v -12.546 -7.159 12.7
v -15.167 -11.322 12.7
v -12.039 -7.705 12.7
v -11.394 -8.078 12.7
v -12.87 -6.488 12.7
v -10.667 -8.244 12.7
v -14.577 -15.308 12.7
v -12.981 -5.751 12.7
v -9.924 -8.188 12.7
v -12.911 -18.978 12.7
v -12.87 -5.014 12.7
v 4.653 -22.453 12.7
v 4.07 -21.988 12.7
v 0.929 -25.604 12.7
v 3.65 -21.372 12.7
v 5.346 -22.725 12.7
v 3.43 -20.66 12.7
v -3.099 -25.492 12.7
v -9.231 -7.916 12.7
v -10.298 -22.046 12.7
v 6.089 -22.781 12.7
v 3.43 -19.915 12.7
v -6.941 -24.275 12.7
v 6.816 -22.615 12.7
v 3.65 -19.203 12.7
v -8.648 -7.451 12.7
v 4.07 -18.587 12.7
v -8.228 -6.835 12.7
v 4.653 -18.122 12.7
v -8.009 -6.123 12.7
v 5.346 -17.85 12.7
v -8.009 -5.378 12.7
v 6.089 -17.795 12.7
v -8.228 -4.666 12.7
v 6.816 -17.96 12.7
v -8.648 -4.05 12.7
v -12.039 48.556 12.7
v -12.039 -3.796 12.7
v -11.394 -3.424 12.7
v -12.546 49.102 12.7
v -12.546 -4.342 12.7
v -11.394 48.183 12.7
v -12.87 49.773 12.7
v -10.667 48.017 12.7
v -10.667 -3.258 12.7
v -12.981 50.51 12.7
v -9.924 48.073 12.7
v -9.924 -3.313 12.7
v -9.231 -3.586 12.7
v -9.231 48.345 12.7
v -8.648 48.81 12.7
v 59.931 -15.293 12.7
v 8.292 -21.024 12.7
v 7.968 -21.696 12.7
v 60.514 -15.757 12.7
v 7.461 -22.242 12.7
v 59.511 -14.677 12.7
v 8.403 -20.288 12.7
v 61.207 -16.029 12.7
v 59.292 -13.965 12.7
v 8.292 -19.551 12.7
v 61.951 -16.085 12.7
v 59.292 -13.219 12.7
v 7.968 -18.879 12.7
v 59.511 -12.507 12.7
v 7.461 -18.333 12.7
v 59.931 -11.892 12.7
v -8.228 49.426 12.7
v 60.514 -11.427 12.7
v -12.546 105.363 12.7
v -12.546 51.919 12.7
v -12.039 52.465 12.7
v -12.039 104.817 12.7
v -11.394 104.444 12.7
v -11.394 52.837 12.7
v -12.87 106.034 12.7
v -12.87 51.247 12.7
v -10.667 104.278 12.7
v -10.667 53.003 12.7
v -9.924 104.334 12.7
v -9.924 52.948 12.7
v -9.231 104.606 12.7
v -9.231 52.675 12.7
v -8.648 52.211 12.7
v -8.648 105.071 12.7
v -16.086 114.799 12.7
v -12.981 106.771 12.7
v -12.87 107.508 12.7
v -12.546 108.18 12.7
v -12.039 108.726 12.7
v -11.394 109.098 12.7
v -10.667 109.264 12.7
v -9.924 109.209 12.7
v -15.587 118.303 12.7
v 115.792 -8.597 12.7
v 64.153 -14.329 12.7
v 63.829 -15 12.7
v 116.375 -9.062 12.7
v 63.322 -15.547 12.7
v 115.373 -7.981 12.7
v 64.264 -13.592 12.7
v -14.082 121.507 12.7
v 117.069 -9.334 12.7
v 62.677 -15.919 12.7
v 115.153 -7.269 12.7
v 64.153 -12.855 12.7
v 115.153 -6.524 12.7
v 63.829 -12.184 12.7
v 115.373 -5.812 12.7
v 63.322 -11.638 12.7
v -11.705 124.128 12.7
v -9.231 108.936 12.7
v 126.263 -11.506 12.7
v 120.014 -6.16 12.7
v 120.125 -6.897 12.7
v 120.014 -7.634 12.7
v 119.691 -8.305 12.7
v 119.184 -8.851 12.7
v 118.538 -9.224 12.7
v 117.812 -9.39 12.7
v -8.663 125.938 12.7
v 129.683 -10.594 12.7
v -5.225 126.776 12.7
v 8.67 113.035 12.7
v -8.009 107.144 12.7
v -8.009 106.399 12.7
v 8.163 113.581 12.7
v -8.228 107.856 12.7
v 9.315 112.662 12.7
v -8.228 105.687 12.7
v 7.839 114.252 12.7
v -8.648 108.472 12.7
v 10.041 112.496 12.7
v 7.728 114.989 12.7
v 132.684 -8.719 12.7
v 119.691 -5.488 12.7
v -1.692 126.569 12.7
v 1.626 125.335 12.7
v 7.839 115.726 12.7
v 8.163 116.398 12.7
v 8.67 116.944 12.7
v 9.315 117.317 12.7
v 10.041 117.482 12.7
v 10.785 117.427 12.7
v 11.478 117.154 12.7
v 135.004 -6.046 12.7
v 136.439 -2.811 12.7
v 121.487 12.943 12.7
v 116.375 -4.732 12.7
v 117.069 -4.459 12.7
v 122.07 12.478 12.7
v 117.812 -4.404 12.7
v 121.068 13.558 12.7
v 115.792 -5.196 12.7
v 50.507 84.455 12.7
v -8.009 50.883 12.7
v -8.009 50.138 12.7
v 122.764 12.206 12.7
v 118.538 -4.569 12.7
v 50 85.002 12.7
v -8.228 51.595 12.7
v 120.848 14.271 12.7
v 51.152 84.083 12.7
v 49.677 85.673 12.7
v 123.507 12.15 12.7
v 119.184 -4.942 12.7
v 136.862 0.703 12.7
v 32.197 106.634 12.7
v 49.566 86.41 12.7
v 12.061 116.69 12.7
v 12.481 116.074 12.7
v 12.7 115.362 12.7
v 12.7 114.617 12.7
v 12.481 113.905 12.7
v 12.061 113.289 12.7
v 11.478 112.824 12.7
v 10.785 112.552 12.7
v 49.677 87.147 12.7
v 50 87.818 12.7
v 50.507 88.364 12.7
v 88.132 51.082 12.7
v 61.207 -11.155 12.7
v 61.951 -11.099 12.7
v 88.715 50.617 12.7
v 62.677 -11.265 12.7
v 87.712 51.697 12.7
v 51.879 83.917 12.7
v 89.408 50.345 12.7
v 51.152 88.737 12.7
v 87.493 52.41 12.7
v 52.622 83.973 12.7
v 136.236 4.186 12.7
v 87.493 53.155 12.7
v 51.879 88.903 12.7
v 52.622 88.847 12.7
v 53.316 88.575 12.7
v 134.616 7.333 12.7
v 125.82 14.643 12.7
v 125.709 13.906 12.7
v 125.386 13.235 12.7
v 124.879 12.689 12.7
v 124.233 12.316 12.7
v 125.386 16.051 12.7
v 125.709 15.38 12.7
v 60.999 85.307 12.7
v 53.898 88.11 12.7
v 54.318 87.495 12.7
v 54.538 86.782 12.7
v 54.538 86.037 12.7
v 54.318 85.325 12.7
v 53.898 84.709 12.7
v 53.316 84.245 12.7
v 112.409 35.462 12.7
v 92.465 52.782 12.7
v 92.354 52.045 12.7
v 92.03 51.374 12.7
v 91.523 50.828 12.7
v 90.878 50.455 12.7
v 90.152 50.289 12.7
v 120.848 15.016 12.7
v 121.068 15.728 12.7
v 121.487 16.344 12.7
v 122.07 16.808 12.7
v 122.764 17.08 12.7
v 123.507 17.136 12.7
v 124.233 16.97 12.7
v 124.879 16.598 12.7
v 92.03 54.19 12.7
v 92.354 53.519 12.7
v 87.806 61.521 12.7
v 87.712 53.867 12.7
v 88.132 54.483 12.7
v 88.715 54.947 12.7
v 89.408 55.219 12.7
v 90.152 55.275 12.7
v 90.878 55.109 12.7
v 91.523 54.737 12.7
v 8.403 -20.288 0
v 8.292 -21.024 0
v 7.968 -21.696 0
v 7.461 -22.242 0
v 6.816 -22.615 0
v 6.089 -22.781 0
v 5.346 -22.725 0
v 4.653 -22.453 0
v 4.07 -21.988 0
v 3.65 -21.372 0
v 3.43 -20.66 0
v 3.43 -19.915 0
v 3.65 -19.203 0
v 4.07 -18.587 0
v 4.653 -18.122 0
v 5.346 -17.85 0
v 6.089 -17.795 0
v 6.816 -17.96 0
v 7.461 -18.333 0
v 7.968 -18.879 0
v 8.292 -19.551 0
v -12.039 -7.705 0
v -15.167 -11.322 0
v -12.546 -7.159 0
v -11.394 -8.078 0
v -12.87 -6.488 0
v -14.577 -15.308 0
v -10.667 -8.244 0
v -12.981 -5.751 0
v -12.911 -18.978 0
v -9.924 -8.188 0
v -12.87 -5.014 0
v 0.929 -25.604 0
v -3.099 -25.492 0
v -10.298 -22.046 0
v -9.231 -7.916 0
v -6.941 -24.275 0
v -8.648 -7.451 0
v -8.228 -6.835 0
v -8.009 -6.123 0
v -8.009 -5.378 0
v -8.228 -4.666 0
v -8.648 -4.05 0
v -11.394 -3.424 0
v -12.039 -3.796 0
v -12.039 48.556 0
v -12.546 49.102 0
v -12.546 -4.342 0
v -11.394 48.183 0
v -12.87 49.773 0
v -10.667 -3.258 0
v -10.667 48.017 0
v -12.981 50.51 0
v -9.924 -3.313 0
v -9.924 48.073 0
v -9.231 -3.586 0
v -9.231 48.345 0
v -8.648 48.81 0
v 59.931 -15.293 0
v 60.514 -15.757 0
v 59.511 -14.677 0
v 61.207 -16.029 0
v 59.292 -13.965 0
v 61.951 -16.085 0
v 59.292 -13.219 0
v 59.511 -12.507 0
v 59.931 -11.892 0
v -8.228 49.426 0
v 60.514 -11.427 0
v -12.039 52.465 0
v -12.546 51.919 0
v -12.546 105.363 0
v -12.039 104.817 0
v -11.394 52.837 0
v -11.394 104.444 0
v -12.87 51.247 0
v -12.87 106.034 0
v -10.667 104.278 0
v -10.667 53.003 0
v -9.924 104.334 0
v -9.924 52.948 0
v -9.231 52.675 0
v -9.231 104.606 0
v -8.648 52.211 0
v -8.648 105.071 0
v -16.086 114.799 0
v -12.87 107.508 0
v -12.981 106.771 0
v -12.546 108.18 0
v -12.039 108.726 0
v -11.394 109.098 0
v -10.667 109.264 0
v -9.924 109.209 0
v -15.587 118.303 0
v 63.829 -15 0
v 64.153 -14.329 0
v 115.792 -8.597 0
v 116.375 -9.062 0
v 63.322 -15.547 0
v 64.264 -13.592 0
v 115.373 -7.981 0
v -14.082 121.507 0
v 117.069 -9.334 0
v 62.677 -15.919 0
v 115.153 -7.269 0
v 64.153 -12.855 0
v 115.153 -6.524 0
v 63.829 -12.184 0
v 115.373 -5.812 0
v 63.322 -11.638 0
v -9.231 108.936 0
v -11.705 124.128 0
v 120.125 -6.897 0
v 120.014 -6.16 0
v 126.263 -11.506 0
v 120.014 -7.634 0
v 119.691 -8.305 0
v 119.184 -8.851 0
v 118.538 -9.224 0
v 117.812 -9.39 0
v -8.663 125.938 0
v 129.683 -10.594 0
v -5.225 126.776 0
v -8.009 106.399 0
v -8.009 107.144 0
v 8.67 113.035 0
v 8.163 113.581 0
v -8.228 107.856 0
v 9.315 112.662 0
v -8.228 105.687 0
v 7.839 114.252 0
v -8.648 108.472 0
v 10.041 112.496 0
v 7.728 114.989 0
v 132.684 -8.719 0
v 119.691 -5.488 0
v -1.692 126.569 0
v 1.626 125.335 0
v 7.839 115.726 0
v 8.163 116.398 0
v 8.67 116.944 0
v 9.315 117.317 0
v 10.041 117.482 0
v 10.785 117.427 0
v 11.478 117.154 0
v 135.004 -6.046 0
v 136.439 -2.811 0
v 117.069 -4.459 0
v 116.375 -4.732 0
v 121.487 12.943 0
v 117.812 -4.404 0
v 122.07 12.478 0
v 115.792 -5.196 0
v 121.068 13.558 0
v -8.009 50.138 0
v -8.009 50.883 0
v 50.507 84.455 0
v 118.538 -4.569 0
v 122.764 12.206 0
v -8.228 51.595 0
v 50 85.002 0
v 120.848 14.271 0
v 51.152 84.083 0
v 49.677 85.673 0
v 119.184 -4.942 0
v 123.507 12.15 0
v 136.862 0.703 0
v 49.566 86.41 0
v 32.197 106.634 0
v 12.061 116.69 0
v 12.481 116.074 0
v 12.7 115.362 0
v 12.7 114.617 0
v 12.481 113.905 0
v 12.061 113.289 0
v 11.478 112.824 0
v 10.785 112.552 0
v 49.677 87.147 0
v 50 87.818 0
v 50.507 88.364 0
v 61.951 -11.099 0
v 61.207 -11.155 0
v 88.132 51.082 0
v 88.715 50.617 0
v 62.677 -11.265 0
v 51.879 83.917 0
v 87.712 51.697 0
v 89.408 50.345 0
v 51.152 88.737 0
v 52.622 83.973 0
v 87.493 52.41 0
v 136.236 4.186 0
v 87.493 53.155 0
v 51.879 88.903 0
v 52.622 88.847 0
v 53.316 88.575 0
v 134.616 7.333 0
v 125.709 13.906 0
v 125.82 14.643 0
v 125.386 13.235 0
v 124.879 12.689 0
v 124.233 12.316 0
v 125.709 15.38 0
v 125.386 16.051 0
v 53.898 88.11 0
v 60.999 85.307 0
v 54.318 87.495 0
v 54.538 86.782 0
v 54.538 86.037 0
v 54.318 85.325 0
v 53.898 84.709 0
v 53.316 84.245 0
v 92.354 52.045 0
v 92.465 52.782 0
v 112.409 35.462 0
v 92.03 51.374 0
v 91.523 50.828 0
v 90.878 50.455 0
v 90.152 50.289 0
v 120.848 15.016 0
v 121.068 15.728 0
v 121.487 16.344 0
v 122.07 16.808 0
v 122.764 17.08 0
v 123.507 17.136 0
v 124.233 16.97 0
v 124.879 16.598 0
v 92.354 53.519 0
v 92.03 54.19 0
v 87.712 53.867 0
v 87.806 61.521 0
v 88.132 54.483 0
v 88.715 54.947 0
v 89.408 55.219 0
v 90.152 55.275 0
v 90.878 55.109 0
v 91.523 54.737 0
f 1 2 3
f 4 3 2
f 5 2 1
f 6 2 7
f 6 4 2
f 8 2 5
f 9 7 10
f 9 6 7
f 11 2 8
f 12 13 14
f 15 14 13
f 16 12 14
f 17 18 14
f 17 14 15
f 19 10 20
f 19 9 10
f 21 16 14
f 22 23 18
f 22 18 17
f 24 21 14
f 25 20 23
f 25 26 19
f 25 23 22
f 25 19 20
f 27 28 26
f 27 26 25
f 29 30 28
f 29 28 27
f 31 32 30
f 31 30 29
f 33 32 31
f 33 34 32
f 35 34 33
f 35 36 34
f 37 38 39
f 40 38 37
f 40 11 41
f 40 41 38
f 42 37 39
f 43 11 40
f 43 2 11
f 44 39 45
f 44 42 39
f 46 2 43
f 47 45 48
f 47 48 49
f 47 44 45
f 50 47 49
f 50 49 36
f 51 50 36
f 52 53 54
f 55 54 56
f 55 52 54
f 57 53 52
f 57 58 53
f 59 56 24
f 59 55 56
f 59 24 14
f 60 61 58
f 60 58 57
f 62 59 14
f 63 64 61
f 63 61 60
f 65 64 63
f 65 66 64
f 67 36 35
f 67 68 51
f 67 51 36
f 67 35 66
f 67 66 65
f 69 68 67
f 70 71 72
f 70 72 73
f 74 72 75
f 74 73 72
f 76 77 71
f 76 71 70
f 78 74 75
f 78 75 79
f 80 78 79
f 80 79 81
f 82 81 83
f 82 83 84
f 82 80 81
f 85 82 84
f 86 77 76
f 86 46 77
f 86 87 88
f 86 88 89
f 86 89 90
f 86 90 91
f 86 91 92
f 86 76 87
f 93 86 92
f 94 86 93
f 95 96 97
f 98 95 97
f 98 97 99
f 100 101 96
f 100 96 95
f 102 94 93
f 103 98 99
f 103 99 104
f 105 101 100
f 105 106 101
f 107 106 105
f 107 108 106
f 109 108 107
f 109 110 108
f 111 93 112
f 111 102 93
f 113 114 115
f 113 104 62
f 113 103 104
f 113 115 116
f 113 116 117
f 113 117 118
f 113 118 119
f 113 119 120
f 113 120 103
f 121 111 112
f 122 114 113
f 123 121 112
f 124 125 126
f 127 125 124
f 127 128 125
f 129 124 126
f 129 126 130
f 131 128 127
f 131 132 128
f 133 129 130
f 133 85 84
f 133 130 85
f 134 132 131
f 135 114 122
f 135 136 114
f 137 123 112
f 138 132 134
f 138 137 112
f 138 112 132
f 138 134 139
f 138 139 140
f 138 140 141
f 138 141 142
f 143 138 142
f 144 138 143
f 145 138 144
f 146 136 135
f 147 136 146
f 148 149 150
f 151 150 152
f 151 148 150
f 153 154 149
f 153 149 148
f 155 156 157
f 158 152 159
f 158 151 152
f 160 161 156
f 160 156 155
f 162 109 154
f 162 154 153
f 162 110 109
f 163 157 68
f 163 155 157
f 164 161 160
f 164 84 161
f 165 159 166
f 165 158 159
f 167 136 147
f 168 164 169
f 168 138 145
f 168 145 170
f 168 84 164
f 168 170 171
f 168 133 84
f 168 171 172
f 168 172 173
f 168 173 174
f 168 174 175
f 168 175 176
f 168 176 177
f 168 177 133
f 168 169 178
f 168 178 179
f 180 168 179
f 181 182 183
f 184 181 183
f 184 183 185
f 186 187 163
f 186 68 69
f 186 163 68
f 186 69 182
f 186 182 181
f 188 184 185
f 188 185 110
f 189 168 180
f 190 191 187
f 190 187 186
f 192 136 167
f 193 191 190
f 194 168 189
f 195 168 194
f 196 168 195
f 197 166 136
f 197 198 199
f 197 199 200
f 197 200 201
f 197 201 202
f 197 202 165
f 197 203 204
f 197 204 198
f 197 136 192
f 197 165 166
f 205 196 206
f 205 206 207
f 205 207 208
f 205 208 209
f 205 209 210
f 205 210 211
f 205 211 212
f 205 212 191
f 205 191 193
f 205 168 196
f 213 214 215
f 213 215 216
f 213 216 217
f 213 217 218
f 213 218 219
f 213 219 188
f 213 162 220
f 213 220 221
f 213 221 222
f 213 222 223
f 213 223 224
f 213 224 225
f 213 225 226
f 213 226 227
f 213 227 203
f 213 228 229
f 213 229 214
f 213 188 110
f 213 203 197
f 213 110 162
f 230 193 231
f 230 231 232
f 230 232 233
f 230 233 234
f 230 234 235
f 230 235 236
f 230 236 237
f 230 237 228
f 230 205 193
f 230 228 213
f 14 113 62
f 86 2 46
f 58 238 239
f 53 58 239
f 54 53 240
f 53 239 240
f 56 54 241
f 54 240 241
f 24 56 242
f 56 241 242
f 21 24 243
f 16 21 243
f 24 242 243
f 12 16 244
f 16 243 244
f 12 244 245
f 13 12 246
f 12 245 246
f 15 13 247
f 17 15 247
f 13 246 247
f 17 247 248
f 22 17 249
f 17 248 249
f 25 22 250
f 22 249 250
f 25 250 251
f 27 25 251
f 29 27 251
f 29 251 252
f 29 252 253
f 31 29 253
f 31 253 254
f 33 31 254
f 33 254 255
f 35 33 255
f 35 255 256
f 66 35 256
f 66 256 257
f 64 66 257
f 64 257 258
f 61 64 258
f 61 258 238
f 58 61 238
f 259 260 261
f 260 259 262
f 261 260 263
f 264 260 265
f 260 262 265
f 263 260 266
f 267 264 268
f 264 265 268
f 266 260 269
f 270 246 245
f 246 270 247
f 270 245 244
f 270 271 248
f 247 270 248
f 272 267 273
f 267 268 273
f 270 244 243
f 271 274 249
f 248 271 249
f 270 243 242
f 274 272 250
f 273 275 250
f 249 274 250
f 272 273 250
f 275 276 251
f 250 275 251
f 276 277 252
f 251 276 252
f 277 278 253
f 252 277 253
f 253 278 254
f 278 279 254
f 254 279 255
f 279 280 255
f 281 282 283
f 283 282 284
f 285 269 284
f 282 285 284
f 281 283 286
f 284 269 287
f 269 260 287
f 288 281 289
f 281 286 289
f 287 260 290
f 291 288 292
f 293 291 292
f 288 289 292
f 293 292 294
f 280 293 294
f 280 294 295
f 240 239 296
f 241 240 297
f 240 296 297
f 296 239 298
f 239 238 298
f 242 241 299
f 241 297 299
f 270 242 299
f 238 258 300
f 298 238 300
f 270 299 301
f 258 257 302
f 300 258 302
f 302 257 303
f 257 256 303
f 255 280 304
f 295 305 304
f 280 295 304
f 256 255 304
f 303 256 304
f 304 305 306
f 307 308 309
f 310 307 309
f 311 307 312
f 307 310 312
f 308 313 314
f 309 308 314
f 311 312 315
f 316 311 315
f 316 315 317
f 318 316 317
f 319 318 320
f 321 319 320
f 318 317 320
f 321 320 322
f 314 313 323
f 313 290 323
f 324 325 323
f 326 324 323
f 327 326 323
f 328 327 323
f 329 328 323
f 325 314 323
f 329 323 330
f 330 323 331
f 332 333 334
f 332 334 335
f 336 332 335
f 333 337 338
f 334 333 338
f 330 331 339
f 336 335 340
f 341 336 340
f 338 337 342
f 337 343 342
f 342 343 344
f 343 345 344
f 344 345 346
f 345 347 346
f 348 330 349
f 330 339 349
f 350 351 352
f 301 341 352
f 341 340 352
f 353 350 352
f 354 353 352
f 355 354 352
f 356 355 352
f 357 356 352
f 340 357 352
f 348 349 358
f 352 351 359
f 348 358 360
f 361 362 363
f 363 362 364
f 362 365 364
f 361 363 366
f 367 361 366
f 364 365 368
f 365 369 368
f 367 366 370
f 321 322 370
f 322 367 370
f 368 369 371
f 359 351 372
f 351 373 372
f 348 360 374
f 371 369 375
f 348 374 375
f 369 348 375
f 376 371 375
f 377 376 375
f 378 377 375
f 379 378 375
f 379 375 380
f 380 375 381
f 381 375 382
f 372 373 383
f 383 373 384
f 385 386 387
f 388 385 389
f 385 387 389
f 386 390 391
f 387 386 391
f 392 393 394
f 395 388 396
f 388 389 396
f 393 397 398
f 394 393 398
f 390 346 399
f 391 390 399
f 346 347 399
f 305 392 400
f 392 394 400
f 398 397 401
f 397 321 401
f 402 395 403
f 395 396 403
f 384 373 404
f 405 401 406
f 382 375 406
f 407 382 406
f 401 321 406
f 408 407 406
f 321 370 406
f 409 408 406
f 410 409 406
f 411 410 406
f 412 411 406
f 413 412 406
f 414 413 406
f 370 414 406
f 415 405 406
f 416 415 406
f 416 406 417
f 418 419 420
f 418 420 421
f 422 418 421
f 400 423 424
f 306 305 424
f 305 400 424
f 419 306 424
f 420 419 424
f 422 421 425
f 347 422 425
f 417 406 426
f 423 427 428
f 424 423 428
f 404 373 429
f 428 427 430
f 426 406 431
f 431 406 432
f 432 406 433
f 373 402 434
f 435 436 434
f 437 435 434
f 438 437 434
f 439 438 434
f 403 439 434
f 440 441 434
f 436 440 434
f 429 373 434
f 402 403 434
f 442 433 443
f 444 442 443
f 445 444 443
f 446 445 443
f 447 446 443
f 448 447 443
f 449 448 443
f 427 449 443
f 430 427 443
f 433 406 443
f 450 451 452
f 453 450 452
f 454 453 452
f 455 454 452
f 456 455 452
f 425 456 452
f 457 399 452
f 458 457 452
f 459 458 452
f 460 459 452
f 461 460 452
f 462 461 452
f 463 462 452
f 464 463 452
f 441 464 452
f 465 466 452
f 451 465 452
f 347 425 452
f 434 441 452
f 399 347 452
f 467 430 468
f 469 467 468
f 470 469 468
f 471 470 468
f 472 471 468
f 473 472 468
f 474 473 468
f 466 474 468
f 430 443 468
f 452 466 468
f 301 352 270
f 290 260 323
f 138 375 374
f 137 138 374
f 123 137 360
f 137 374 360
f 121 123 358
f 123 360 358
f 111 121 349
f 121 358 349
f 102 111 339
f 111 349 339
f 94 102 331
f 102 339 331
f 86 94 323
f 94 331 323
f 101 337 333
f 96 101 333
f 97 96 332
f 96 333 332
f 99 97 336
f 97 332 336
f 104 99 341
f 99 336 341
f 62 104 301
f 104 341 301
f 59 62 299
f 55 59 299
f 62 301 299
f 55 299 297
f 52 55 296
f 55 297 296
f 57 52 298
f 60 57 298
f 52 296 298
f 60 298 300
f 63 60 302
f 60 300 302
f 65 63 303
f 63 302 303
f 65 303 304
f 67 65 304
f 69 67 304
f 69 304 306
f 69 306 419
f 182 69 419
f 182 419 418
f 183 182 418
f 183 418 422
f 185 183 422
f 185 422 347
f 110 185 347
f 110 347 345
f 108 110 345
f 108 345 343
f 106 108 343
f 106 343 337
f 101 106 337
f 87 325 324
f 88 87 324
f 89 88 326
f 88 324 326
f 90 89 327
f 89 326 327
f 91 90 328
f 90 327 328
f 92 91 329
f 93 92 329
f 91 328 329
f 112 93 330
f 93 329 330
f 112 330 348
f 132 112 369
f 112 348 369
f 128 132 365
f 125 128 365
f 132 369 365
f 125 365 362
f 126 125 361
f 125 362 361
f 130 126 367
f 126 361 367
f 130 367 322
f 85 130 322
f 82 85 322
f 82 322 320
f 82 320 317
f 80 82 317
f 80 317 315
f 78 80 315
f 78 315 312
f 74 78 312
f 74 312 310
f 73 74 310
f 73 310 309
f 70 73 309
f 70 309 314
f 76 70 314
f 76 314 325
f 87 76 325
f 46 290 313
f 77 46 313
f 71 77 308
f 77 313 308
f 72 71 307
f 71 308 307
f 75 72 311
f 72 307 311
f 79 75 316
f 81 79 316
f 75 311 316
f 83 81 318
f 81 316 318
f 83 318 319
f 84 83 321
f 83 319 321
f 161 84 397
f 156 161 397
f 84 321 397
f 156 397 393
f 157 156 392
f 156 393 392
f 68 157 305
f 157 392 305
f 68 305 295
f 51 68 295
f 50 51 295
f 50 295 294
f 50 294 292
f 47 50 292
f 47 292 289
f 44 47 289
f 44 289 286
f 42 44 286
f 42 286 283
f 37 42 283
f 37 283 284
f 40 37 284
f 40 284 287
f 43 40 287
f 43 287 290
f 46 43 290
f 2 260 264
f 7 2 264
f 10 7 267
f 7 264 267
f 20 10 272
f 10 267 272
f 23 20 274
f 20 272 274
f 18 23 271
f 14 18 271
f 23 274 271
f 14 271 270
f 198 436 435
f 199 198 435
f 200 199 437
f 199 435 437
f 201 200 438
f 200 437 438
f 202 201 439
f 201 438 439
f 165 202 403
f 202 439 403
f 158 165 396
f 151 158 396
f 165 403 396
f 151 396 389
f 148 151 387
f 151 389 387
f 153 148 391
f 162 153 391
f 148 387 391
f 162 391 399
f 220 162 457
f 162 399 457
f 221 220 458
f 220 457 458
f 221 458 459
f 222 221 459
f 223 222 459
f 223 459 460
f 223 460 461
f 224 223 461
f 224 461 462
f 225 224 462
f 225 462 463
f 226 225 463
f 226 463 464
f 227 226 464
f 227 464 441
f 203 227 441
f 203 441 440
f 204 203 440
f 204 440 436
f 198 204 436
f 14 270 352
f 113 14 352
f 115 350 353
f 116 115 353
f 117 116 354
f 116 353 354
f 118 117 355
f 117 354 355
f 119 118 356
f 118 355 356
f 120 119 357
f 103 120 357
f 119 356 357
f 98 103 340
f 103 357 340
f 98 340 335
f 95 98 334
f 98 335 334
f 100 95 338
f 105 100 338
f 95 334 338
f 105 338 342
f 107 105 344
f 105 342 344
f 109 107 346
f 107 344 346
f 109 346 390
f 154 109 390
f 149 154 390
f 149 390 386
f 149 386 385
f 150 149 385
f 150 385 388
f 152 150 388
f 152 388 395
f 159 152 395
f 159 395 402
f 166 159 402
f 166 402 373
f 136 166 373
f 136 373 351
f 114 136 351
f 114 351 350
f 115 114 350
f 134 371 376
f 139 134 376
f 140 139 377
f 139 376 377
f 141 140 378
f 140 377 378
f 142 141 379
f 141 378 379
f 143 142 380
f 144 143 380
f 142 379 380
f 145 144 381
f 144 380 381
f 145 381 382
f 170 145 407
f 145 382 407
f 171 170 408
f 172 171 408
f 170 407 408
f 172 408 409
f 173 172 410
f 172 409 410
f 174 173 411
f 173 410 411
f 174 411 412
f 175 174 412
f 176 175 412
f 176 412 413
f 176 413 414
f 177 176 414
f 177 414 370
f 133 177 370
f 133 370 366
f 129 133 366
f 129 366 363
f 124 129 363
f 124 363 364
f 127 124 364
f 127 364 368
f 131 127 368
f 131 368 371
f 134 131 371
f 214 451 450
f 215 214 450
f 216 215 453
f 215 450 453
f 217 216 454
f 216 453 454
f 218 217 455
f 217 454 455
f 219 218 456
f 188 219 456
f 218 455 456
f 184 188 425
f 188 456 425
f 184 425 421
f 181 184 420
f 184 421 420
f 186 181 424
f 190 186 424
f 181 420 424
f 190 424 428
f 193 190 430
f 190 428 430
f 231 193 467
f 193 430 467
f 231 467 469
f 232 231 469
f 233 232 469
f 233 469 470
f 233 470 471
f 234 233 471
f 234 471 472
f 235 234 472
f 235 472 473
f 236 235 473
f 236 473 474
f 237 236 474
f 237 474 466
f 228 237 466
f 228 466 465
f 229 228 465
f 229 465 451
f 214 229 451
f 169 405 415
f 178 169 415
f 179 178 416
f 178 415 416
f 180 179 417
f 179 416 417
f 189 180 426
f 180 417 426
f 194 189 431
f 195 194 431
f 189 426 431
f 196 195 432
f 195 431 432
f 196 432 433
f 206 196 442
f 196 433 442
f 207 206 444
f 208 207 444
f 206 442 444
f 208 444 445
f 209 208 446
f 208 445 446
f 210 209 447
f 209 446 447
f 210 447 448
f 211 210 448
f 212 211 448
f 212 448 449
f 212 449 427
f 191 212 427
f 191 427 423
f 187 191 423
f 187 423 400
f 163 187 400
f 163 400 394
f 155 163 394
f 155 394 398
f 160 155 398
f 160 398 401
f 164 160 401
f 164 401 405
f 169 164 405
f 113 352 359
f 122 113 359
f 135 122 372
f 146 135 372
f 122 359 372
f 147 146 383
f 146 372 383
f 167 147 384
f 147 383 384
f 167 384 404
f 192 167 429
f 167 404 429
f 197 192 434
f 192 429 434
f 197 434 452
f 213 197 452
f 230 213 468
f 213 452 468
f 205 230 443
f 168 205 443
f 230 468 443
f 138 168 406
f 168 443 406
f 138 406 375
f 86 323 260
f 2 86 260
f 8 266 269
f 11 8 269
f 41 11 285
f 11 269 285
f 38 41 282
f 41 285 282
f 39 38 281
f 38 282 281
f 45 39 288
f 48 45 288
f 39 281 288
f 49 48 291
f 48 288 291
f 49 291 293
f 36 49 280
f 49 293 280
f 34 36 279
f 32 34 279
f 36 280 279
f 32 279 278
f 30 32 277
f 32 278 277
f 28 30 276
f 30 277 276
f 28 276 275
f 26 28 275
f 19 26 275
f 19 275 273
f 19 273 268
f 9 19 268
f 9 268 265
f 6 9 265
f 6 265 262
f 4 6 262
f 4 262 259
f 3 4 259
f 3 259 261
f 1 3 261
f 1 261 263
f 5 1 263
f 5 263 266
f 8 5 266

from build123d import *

# Parameters (mm, degrees)
BOSS_EXTRUDE1_DEPTH = 12.7
SKETCH2_R           = 2.5
CUT_EXTRUDE1_DEPTH  = 188.024650501


with BuildPart() as part:
    # Sketch1 → Boss-Extrude1 (new body)
    with BuildSketch(Plane.XY):
        with BuildLine():
            Line((0.928877391, -25.603544091), (126.263071952, -11.506498815))
            ThreePointArc((126.263071952, -11.506498815), (135.842076702, -4.482224693), (134.616347537, 7.332822786))
            ThreePointArc((134.616347537, 7.332822786), (74.665711789, 73.710136722), (1.625549575, 125.335336338))
            ThreePointArc((1.625549575, 125.335336338), (-10.25140355, 125.146277033), (-16.085786649, 114.799406357))
            Line((-16.085786649, 114.799406357), (-15.166957214, -11.321736852))
            ThreePointArc((-15.166957214, -11.321736852), (-10.298375042, -22.045804112), (0.928877391, -25.603544091))
        make_face()
    extrude(amount=BOSS_EXTRUDE1_DEPTH)

    # Sketch2 → Cut-Extrude1 (cut, through all)
    with BuildSketch(Plane(origin=(0, 0, 0), x_dir=(-1, 0, 0), z_dir=(0, 0, -1))):
        with Locations((10.480661871, 106.771257069)):
            Circle(SKETCH2_R)
        with Locations((10.480661871, 50.510257069)):
            Circle(SKETCH2_R)
        with Locations((10.480661871, -5.750742931)):
            Circle(SKETCH2_R)
        with Locations((-52.065748574, 86.409889957)):
            Circle(SKETCH2_R)
        with Locations(Location((-89.964774668, 52.78214722, 0), (0, 0, 180))):
            Circle(SKETCH2_R)
        with Locations(Location((-123.32009462, 14.643139741, 0), (0, 0, 180))):
            Circle(SKETCH2_R)
        with Locations((-10.228252117, 114.989343254)):
            Circle(SKETCH2_R)
        with Locations(Location((-117.624924608, -6.89661647, 0), (0, 0, 180))):
            Circle(SKETCH2_R)
        with Locations(Location((-61.763750637, -13.592089836, 0), (0, 0, 180))):
            Circle(SKETCH2_R)
        with Locations(Location((-5.902576666, -20.287563201, 0), (0, 0, 180))):
            Circle(SKETCH2_R)
    extrude(amount=-CUT_EXTRUDE1_DEPTH, mode=Mode.SUBTRACT)


solid = part.part
